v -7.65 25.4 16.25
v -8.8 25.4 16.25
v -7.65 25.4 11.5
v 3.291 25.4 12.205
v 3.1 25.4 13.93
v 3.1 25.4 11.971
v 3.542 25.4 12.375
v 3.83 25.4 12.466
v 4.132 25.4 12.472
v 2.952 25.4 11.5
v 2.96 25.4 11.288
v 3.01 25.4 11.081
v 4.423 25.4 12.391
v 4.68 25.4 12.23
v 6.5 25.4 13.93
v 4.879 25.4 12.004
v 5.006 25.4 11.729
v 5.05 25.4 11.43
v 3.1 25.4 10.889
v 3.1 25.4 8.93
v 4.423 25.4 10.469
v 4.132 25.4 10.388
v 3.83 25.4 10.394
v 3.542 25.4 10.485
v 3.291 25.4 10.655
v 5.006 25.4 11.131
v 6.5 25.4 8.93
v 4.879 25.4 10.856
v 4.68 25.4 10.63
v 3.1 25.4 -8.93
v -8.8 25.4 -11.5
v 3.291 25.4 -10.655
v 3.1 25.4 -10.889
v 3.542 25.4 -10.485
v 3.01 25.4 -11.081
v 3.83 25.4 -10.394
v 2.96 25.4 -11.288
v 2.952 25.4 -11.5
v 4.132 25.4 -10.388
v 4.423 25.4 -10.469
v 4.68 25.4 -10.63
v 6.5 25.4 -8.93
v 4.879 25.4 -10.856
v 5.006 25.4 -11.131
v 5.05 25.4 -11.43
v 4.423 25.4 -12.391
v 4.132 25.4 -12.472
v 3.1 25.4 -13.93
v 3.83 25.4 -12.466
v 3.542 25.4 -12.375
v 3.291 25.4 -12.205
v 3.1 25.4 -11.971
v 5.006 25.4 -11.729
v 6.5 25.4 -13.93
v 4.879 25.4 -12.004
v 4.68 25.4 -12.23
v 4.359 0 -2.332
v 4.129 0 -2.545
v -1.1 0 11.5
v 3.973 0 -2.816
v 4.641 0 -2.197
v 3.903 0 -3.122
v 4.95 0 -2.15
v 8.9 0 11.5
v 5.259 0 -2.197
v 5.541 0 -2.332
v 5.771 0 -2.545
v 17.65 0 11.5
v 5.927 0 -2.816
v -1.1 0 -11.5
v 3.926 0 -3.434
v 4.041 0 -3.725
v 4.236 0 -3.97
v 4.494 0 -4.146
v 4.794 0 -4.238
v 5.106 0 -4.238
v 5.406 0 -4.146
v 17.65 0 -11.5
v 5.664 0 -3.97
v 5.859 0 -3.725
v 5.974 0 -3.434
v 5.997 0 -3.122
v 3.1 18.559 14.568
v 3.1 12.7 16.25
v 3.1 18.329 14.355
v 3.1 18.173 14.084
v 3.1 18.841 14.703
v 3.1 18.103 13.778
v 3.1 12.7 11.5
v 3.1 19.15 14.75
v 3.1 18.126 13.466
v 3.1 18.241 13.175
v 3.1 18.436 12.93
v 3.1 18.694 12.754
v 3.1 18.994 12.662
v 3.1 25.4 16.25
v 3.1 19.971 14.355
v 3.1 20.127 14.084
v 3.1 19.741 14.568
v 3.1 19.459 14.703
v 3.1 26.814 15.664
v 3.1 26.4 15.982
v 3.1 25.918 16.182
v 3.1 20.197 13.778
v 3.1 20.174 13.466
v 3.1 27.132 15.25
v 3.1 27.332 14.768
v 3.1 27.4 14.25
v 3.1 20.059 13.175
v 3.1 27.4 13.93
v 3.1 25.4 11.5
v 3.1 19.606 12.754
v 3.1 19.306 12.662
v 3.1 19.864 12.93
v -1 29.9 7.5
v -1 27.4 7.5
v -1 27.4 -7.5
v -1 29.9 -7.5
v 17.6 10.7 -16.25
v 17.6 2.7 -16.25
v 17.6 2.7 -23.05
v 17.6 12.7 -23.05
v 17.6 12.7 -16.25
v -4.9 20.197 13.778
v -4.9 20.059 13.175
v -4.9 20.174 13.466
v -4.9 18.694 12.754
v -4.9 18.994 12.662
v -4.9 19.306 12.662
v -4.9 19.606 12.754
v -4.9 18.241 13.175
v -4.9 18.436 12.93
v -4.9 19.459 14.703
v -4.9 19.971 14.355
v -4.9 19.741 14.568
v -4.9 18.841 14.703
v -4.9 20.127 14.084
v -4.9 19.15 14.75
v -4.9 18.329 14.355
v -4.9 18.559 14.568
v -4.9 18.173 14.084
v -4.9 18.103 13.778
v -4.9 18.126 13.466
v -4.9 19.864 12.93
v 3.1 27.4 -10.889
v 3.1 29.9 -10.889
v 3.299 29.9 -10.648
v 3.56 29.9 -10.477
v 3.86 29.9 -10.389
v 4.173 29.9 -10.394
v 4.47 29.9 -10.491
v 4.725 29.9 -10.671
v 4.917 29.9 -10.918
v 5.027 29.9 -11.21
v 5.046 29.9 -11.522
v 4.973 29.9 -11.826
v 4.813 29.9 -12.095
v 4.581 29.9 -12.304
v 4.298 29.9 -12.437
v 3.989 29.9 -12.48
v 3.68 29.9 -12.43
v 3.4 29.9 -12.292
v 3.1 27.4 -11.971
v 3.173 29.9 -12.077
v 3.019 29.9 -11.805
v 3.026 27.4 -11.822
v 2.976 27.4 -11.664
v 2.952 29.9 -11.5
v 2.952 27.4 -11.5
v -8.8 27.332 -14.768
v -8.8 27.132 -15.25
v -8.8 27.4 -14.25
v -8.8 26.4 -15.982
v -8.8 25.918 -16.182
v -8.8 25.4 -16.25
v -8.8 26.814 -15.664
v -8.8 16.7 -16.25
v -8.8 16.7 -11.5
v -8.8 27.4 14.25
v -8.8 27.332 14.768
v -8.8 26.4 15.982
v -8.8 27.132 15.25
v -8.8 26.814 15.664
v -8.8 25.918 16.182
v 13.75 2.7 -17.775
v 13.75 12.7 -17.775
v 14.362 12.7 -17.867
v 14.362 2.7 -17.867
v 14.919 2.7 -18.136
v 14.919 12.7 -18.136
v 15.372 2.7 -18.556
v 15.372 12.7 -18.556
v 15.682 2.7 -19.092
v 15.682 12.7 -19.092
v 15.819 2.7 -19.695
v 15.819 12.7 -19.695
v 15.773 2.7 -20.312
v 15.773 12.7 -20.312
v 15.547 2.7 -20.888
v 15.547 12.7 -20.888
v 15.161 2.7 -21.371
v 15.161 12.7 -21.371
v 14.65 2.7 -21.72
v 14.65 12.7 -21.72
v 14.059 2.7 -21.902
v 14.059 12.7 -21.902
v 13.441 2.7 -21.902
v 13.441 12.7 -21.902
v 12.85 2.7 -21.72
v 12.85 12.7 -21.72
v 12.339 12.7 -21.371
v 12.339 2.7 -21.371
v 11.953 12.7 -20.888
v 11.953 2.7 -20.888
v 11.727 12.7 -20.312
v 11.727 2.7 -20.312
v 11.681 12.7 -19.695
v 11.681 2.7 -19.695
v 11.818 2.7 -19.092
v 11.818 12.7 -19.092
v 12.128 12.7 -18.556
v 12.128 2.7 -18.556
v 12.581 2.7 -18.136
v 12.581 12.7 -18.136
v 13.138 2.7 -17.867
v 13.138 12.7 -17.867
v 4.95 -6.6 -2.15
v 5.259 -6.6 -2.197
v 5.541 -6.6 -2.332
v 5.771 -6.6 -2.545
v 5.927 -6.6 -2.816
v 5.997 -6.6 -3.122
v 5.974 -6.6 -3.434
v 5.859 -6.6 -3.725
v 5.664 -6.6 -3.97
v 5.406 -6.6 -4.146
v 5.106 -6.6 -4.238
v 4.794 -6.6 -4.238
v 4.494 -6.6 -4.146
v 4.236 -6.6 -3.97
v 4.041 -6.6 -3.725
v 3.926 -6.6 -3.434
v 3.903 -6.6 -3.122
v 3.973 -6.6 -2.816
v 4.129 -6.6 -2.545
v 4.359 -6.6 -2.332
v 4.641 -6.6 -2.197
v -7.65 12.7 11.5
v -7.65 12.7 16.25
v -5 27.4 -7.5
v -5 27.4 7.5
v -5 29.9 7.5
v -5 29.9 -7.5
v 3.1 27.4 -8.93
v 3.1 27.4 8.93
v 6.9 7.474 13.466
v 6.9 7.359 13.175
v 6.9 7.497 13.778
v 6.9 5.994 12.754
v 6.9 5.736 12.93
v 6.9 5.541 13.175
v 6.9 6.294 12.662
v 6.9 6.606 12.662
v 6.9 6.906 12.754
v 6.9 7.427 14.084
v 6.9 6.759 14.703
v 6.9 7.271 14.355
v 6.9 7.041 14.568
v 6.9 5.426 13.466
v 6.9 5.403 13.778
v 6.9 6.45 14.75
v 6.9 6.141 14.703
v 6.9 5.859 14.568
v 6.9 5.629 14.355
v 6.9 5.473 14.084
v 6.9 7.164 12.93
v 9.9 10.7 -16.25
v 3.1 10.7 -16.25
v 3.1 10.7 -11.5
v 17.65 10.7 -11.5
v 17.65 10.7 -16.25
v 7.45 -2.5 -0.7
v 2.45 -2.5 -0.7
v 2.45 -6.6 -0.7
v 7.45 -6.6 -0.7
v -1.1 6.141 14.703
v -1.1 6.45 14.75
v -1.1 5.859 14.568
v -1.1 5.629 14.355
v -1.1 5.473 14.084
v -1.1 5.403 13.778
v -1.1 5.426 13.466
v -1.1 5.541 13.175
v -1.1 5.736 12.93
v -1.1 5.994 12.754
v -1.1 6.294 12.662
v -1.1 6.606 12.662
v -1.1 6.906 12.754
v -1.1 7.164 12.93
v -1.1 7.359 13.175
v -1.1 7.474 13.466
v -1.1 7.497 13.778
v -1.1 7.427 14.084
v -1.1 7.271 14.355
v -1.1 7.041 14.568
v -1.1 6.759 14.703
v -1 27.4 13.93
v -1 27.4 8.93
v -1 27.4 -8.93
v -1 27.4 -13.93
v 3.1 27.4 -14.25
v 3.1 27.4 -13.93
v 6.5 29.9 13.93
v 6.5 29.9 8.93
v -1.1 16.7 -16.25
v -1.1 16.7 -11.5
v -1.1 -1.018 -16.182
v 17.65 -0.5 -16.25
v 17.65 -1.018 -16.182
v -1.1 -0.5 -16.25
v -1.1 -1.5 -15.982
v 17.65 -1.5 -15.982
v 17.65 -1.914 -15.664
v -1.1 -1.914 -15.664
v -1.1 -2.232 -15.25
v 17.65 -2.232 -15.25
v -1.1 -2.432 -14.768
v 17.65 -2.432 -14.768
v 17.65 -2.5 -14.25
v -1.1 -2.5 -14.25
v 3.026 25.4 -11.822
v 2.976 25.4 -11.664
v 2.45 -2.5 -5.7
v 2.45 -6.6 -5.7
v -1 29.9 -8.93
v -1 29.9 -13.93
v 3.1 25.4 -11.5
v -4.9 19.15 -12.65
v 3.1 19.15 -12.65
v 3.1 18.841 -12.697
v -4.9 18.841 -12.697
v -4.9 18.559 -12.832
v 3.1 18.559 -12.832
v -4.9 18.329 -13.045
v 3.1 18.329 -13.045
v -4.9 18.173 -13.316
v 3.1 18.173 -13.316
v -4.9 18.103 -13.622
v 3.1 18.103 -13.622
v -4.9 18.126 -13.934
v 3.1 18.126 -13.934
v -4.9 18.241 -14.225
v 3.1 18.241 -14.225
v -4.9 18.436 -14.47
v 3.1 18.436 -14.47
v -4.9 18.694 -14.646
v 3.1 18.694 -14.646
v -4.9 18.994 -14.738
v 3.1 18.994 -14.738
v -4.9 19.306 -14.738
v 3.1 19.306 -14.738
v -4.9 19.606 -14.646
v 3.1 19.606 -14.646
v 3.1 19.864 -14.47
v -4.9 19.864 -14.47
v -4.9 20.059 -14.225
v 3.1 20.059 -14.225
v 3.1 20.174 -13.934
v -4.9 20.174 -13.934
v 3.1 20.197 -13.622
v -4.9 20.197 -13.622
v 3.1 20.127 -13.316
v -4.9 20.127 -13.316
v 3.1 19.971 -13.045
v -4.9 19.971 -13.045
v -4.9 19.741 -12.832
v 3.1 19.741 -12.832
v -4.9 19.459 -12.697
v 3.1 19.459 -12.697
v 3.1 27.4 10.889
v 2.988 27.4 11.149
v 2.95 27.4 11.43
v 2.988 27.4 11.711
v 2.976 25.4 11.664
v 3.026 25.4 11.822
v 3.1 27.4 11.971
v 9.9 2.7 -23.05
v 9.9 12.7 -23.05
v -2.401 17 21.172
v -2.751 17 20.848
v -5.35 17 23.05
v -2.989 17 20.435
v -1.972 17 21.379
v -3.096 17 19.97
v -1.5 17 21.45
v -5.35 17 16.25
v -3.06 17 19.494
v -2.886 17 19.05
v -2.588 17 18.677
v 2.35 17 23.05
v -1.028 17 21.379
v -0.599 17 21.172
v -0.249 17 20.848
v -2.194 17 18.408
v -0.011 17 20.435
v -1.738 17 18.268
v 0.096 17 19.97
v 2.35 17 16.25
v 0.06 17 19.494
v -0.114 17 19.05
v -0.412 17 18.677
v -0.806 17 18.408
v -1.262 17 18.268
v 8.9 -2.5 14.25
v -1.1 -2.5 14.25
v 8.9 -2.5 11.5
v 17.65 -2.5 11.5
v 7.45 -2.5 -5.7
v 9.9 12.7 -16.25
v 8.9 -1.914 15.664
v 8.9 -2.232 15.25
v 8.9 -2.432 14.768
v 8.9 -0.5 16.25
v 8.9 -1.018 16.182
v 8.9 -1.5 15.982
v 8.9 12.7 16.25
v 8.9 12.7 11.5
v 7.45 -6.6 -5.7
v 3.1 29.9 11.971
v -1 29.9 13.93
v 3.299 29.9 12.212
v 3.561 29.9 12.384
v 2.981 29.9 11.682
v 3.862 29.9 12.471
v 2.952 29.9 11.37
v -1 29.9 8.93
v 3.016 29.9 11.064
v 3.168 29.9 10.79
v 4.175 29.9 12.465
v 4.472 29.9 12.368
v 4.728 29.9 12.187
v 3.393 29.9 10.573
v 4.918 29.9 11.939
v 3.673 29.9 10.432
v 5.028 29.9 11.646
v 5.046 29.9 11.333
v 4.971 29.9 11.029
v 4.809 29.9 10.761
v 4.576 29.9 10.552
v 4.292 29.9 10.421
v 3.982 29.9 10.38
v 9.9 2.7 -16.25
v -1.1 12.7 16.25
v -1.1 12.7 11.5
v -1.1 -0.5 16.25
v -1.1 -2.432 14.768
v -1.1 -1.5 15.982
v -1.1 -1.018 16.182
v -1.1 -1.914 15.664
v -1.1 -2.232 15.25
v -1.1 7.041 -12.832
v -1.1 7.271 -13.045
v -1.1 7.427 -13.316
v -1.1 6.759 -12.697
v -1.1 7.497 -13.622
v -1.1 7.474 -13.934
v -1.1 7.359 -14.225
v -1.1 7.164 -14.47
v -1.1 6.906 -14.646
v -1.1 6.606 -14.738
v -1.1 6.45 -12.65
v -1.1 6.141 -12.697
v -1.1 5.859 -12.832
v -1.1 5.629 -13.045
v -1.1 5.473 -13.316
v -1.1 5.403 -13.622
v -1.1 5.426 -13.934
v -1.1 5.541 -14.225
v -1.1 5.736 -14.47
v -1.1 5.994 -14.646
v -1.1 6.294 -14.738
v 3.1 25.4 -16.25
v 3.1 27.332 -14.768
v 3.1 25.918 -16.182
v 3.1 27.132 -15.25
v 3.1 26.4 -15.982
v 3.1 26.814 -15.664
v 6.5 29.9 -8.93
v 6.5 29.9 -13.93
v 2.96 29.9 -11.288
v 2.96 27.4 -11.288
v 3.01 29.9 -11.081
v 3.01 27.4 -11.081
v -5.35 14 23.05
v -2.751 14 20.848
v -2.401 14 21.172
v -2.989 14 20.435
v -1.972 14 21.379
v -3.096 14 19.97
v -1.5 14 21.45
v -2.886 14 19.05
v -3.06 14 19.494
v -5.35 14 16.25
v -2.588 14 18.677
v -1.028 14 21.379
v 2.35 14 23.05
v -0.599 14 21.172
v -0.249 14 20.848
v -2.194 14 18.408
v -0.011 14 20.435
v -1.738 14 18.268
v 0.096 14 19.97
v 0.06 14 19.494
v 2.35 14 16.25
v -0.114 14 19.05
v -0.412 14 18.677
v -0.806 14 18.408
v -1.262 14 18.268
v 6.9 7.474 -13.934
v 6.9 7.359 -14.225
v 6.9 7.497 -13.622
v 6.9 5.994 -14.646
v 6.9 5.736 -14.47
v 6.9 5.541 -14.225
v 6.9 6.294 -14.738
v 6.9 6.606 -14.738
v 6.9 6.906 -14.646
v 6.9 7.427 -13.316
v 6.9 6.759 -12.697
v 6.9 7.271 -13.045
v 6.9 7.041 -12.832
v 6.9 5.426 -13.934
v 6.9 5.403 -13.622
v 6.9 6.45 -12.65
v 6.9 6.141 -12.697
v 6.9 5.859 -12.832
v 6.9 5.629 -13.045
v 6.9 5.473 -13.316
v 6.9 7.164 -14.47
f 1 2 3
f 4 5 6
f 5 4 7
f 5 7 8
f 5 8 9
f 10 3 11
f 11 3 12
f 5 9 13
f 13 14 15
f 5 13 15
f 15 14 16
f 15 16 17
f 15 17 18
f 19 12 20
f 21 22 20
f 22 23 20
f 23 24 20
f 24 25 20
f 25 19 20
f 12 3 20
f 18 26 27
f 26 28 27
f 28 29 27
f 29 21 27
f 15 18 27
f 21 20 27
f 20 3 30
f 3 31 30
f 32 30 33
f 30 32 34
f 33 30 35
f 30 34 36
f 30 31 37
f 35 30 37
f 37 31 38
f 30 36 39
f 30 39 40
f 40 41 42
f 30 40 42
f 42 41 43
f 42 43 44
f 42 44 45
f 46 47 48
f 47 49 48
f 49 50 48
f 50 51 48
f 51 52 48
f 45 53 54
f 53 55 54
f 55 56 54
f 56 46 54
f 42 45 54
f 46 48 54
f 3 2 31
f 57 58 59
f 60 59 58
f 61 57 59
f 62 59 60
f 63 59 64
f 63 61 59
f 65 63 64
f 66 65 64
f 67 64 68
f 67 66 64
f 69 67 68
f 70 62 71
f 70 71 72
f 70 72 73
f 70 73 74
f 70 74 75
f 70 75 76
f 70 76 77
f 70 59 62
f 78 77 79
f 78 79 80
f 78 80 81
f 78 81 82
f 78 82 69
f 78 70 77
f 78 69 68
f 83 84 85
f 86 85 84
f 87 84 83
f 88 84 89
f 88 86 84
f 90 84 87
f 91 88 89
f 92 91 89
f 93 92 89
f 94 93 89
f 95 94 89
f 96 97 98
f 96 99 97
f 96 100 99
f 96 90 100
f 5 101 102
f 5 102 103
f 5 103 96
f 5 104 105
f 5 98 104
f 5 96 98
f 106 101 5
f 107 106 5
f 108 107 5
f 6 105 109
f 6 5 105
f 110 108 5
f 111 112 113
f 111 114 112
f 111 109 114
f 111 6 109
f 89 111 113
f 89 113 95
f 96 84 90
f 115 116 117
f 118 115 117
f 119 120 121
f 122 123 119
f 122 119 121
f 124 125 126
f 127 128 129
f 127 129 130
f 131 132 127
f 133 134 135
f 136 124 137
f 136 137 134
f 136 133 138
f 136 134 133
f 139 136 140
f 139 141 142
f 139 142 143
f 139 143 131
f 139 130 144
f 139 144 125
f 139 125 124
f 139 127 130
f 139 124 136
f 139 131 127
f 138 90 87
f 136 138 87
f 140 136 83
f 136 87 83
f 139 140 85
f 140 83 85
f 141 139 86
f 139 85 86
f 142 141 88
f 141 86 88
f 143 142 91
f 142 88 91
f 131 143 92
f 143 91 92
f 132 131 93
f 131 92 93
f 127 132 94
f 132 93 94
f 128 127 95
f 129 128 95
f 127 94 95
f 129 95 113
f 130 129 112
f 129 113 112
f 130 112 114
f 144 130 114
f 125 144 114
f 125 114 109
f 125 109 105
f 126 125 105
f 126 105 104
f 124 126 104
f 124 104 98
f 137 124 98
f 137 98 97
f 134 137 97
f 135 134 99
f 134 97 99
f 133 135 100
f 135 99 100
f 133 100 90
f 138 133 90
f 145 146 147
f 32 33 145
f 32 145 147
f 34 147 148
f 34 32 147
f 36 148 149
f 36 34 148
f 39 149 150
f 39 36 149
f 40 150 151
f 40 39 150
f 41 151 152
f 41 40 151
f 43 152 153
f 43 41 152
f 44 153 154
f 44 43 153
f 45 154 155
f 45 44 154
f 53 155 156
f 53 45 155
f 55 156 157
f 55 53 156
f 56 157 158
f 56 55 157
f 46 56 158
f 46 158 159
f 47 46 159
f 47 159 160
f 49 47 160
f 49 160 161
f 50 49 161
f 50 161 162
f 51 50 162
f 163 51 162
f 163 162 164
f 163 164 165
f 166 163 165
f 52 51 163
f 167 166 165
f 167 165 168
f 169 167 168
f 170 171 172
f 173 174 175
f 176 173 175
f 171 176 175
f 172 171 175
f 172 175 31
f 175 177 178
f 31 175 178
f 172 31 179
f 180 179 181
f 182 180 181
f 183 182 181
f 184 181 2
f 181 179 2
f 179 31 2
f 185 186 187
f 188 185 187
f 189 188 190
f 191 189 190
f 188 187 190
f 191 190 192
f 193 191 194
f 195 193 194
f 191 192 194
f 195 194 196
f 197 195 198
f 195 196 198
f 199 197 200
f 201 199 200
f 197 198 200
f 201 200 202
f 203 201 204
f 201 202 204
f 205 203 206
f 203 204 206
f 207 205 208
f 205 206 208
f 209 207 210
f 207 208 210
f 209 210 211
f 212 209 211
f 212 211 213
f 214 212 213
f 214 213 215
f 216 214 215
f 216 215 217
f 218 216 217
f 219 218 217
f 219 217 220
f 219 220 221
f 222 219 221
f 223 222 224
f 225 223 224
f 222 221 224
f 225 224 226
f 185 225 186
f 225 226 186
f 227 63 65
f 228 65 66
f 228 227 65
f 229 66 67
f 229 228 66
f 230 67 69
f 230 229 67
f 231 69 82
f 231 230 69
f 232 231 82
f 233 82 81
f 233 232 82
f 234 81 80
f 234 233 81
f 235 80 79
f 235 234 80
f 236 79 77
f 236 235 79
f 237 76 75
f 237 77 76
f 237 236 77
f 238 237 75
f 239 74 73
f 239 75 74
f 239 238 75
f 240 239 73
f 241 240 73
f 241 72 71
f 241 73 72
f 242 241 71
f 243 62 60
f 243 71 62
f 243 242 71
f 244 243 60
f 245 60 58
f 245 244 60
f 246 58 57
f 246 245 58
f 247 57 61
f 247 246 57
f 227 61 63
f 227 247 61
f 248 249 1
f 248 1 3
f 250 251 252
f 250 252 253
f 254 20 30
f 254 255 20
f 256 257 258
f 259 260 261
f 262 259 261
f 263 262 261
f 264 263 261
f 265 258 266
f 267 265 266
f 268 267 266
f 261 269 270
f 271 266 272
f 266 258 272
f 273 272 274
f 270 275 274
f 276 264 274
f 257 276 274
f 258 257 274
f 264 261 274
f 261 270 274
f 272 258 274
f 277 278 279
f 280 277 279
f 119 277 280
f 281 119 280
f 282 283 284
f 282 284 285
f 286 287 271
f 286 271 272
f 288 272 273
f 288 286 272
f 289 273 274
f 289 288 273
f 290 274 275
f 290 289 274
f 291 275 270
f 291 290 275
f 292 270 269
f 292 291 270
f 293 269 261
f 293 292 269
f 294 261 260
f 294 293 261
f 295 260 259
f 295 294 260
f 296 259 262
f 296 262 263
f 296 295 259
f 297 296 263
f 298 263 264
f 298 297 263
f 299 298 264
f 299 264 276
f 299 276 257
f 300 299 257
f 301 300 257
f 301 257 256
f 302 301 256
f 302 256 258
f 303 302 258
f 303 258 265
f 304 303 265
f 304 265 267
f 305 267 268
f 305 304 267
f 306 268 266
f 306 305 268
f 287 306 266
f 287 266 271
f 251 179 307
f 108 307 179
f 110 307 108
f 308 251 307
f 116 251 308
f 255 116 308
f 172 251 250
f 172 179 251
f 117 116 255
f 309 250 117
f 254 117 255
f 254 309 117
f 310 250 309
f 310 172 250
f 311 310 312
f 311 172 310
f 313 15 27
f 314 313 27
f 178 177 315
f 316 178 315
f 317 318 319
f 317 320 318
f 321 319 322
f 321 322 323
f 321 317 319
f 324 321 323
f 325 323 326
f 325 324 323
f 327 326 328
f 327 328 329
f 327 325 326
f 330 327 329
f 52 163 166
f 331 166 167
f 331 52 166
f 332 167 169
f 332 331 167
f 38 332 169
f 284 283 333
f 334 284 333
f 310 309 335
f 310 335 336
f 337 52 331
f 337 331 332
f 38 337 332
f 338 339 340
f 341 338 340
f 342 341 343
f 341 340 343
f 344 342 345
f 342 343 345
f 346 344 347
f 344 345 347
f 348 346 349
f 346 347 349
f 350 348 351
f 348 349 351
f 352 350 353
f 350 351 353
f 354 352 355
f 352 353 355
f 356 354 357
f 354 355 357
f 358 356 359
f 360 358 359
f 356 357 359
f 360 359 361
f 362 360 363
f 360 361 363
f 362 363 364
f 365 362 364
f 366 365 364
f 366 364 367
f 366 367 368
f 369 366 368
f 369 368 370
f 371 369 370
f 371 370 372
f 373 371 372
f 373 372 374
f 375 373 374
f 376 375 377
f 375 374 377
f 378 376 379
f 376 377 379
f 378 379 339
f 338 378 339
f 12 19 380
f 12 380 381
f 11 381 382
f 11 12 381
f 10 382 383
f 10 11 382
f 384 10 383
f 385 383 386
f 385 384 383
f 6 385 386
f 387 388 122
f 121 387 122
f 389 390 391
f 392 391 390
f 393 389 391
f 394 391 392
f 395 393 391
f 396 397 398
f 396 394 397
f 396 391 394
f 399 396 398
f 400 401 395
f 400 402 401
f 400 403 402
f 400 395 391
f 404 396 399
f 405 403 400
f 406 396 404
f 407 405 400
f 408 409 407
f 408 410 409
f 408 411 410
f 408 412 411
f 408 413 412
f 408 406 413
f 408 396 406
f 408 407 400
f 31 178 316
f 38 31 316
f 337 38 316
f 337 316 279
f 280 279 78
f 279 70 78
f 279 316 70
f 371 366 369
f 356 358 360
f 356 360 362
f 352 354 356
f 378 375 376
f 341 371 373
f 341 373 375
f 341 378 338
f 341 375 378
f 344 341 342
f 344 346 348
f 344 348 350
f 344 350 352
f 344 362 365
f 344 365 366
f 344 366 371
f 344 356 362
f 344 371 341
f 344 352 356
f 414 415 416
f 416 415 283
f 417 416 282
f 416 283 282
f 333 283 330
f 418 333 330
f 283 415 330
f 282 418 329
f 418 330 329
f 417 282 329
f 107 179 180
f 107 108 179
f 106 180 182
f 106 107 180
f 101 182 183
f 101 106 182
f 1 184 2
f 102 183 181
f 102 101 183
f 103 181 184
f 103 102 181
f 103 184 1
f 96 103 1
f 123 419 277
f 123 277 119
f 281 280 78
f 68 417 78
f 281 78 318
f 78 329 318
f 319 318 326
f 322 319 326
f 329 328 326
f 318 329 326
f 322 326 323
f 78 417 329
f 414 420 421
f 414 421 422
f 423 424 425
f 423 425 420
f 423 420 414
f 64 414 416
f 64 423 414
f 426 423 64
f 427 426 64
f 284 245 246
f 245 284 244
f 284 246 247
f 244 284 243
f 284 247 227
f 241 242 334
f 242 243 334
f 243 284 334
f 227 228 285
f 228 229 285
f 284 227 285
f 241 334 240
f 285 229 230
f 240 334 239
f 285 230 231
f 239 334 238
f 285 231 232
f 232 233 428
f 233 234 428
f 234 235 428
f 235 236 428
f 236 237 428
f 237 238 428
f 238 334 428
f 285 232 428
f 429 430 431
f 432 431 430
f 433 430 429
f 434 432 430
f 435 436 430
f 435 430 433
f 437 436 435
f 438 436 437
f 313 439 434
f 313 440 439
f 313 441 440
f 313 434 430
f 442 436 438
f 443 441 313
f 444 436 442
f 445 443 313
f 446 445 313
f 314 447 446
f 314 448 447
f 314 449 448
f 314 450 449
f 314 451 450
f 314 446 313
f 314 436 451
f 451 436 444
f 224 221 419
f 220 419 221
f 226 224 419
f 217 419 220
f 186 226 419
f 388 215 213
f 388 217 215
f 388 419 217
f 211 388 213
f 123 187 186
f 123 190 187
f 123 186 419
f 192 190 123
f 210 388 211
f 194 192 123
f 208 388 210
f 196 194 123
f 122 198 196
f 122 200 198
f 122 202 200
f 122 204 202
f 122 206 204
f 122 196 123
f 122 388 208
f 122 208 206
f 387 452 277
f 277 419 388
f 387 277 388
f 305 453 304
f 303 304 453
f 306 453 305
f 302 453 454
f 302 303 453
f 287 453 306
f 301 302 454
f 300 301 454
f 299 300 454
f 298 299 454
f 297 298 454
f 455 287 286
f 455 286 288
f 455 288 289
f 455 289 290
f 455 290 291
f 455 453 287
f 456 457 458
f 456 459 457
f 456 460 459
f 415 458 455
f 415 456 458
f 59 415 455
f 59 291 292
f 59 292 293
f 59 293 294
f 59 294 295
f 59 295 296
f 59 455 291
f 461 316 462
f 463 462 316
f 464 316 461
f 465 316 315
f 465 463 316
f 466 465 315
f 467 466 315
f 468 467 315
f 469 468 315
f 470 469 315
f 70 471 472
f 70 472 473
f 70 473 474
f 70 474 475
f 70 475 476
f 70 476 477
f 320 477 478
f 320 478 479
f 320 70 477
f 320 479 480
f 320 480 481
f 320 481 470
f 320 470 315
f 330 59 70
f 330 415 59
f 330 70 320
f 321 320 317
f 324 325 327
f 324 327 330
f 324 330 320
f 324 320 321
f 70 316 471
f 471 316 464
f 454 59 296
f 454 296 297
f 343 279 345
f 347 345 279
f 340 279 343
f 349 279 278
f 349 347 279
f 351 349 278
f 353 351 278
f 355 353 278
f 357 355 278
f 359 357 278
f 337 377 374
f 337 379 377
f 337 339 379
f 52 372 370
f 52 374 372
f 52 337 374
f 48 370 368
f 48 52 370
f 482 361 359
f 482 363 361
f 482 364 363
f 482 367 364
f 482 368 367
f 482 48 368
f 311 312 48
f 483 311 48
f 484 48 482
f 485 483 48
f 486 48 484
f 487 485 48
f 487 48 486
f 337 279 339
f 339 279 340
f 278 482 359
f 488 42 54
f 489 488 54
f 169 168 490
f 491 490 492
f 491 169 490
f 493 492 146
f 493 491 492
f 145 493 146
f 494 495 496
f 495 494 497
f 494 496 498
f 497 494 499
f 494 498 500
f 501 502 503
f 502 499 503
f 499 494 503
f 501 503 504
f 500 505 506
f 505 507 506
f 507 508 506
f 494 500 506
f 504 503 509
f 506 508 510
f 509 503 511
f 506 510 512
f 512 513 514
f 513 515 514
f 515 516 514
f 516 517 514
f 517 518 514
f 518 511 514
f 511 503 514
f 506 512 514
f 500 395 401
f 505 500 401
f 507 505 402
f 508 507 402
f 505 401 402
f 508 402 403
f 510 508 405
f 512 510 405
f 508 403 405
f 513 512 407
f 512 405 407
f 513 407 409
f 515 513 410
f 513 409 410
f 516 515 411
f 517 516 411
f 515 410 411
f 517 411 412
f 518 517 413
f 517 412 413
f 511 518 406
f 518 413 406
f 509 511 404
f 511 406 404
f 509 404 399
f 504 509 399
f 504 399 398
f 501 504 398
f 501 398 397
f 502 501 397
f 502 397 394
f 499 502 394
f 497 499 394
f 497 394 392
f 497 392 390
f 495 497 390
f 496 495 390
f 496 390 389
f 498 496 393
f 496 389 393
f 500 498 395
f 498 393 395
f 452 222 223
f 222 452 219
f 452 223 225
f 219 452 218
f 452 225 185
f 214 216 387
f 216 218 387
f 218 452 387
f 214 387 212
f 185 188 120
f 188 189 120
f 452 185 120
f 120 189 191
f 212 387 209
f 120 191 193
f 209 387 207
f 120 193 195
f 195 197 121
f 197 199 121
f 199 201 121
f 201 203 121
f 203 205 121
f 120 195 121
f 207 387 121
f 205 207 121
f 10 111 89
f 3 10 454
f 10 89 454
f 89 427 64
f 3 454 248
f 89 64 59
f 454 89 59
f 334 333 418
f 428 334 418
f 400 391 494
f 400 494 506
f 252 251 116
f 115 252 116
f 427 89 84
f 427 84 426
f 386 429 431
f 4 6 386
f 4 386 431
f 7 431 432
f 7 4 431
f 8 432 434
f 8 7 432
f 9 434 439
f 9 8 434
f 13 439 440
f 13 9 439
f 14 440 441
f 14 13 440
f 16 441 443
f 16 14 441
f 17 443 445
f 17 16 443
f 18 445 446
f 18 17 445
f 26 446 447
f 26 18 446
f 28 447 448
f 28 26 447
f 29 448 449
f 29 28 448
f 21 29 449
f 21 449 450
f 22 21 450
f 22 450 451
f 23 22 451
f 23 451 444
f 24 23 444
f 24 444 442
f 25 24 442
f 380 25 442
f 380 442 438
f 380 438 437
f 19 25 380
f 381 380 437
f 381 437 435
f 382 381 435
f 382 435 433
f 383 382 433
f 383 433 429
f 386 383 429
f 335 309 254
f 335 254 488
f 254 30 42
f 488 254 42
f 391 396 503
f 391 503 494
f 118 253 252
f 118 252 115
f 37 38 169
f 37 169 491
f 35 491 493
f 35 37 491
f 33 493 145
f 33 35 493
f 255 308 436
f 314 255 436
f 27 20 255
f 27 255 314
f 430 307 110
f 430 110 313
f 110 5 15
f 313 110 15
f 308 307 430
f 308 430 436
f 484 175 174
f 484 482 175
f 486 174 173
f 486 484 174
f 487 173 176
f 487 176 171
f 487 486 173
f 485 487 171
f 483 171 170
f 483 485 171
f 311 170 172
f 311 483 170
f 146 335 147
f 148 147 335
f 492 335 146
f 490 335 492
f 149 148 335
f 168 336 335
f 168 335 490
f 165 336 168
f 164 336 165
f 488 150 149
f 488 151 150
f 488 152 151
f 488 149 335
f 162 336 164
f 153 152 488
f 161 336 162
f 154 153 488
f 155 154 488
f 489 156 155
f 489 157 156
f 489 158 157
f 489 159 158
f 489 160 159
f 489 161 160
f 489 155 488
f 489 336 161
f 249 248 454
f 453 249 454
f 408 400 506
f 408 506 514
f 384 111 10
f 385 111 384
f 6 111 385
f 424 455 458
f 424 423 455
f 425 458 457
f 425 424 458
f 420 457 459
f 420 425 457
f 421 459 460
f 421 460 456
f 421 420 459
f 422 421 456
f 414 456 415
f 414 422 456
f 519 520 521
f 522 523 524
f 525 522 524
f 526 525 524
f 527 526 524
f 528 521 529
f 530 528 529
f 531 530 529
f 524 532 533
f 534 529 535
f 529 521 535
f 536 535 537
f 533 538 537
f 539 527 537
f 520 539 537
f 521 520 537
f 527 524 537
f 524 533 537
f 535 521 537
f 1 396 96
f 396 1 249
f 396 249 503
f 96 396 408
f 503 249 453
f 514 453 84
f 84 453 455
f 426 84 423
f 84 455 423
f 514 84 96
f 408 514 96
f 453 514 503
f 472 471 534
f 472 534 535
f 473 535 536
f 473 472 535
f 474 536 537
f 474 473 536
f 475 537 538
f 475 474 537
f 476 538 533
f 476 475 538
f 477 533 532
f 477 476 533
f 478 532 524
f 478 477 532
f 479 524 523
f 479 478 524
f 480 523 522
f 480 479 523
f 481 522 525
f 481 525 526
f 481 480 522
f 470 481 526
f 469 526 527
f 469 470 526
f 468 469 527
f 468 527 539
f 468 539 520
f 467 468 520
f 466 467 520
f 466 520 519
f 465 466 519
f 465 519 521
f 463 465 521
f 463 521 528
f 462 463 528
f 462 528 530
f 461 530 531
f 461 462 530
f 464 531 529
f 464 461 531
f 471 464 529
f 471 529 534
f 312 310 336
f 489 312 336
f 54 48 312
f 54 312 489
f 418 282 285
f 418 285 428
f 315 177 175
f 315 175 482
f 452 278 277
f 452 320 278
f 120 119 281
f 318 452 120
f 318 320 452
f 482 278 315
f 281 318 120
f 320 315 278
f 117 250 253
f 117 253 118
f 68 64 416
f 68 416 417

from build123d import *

# Parameters (mm, degrees)
BOSS_EXTRUDE1_DEPTH      = 2.5
BOSS_EXTRUDE2_DEPTH      = 12.7
BOSS_EXTRUDE3_START      = 12.7
SKETCH3_W                = 11.9
SKETCH3_H                = 4.75
SKETCH3_W_2              = 10.75
BOSS_EXTRUDE3_DEPTH      = 12.7
BOSS_EXTRUDE4_START      = 25.4
SKETCH3_3_W              = 11.9
SKETCH3_3_H              = 4.75
SKETCH3_3_W_2            = 10.75
SKETCH3_3_W_3            = 1.15
BOSS_EXTRUDE4_DEPTH      = 2
CUT_EXTRUDE1_START       = -1.1
SKETCH2_R                = 1.05
CUT_EXTRUDE1_DEPTH       = 8
CUT_EXTRUDE2_START       = 3.1
SKETCH2_3_R              = 1.05
CUT_EXTRUDE2_DEPTH       = 8
BOSS_EXTRUDE5_START      = 17
SKETCH1_4_R              = 1.6
BOSS_EXTRUDE5_DEPTH      = 3
BOSS_EXTRUDE6_START      = 12.7
SKETCH1_7_W              = 7.7
SKETCH1_7_H              = 6.8
SKETCH1_7_R              = 2.075
BOSS_EXTRUDE6_DEPTH      = 10
FILLET1_R                = 2
CUT_EXTRUDE3_START       = 12.7
SKETCH5_W                = 14.55
SKETCH5_H                = 4.75
CUT_EXTRUDE3_DEPTH       = 2
CUT_EXTRUDE4_START       = 12.7
SKETCH6_W                = 7.7
SKETCH6_H                = 4.75
CUT_EXTRUDE4_DEPTH       = 4
BOSS_EXTRUDE7_DEPTH      = 2.5
BOSS_EXTRUDE7_DEPTH_BACK = 2
BOSS_EXTRUDE7_START      = 27.4
SKETCH7_W                = 4
SKETCH7_H                = 15
SKETCH7_W_2              = 5
SKETCH7_H_2              = 5
SKETCH7_R                = 1.05
SKETCH7_W_3              = 2.5
BOSS_EXTRUDE8_START      = -2.5
SKETCH8_W                = 5
SKETCH8_H                = 5
SKETCH8_R                = 1.05
BOSS_EXTRUDE8_DEPTH      = 4.1
CUT_EXTRUDE5_DEPTH       = 42.675352428
CUT_EXTRUDE5_DEPTH_BACK  = 42.675352428
SKETCH8_2_R              = 1.05
CUT_EXTRUDE6_START       = 25.4
SKETCH7_4_R              = 1.05
CUT_EXTRUDE6_DEPTH       = 4.5


with BuildPart() as part:
    # Sketch1 → Boss-Extrude1 (new body)
    with BuildSketch(Plane(origin=(0, 0, 0), x_dir=(1, 0, 0), z_dir=(0, 1, 0))):
        Polygon((-1.1, 16.25), (-1.1, -16.25), (8.9, -16.25), (8.9, -11.5), (17.65, -11.5), (17.65, 16.25), align=None)
    extrude(amount=-BOSS_EXTRUDE1_DEPTH)

    # Sketch1<3> → Boss-Extrude2 (add)
    with BuildSketch(Plane(origin=(0, 0, 0), x_dir=(1, 0, 0), z_dir=(0, 1, 0))):
        Polygon((9.9, 16.25), (-1.1, 16.25), (-1.1, 11.5), (17.65, 11.5), (17.65, 16.25), (17.6, 16.25), align=None)
        Polygon((8.9, -11.5), (-1.1, -11.5), (-1.1, -16.25), (2.35, -16.25), (8.9, -16.25), align=None)
    extrude(amount=BOSS_EXTRUDE2_DEPTH)

    # Sketch3 → Boss-Extrude3 (add)
    with BuildSketch(Plane(origin=(0, 0, 0), x_dir=(1, 0, 0), z_dir=(0, 1, 0)).offset(BOSS_EXTRUDE3_START)):
        with Locations((-2.85, 13.875)):
            Rectangle(SKETCH3_W, SKETCH3_H)
        with Locations((-2.275, -13.875)):
            Rectangle(SKETCH3_W_2, SKETCH3_H)
    extrude(amount=BOSS_EXTRUDE3_DEPTH)

    # Sketch3<3> → Boss-Extrude4 (add)
    with BuildSketch(Plane(origin=(0, 0, 0), x_dir=(1, 0, 0), z_dir=(0, 1, 0)).offset(BOSS_EXTRUDE4_START)):
        with Locations((-2.85, 13.875)):
            Rectangle(SKETCH3_3_W, SKETCH3_3_H)
        Polygon((3.1, -11.5), (3.1, 11.5), (-8.8, 11.5), (-8.8, -11.5), (-7.65, -11.5), align=None)
        with Locations((-2.275, -13.875)):
            Rectangle(SKETCH3_3_W_2, SKETCH3_3_H)
        with Locations((-8.225, -13.875)):
            Rectangle(SKETCH3_3_W_3, SKETCH3_3_H)
    extrude(amount=BOSS_EXTRUDE4_DEPTH)

    # Sketch2 → Cut-Extrude1 (cut)
    with BuildSketch(Plane(origin=(0, 0, 0), x_dir=(0, 0, -1), z_dir=(1, 0, 0)).offset(CUT_EXTRUDE1_START)):
        with Locations(Location((-13.7, 6.45, 0), (0, 0, 180))):
            Circle(SKETCH2_R)
        with Locations(Location((13.7, 6.45, 0), (0, 0, 180))):
            Circle(SKETCH2_R)
    extrude(amount=CUT_EXTRUDE1_DEPTH, mode=Mode.SUBTRACT)

    # Sketch2<3> → Cut-Extrude2 (cut)
    with BuildSketch(Plane(origin=(0, 0, 0), x_dir=(0, 0, -1), z_dir=(1, 0, 0)).offset(CUT_EXTRUDE2_START)):
        with Locations(Location((13.7, 19.15, 0), (0, 0, 180))):
            Circle(SKETCH2_3_R)
        with Locations(Location((-13.7, 19.15, 0), (0, 0, 180))):
            Circle(SKETCH2_3_R)
    extrude(amount=-CUT_EXTRUDE2_DEPTH, mode=Mode.SUBTRACT)

    # Sketch1<4> → Boss-Extrude5 (add)
    with BuildSketch(Plane(origin=(0, 0, 0), x_dir=(1, 0, 0), z_dir=(0, 1, 0)).offset(BOSS_EXTRUDE5_START)):
        Polygon((2.35, -16.25), (-1.1, -16.25), (-3.8, -16.25), (-5.35, -16.25), (-5.35, -23.05), (2.35, -23.05), align=None)
        with Locations(Location((-1.5, -19.85, 0), (0, 0, 270))):
            Circle(SKETCH1_4_R, mode=Mode.SUBTRACT)
    extrude(amount=-BOSS_EXTRUDE5_DEPTH)

    # Sketch1<7> → Boss-Extrude6 (add)
    with BuildSketch(Plane(origin=(0, 0, 0), x_dir=(1, 0, 0), z_dir=(0, 1, 0)).offset(BOSS_EXTRUDE6_START)):
        with Locations((13.75, 19.65)):
            Rectangle(SKETCH1_7_W, SKETCH1_7_H)
        with Locations(Location((13.75, 19.85, 0), (0, 0, 270))):
            Circle(SKETCH1_7_R, mode=Mode.SUBTRACT)
    extrude(amount=-BOSS_EXTRUDE6_DEPTH)

    # Fillet1
    fillet1_edges = [part.edges().sort_by_distance(p)[0] for p in [
        (3.9, -2.5, 16.25),
        (-2.85, 27.4, 16.25),
        (8.275, -2.5, -16.25),
        (-2.85, 27.4, -16.25),
    ]]
    fillet(fillet1_edges, radius=FILLET1_R)

    # Sketch5 → Cut-Extrude3 (cut)
    with BuildSketch(Plane(origin=(0, 0, 0), x_dir=(1, 0, 0), z_dir=(0, 1, 0)).offset(CUT_EXTRUDE3_START)):
        with Locations((10.375, 13.875)):
            Rectangle(SKETCH5_W, SKETCH5_H)
    extrude(amount=-CUT_EXTRUDE3_DEPTH, mode=Mode.SUBTRACT)

    # Sketch6 → Cut-Extrude4 (cut)
    with BuildSketch(Plane(origin=(0, 0, 0), x_dir=(1, 0, 0), z_dir=(0, 1, 0)).offset(CUT_EXTRUDE4_START)):
        with Locations((-4.95, 13.875)):
            Rectangle(SKETCH6_W, SKETCH6_H)
    extrude(amount=CUT_EXTRUDE4_DEPTH, mode=Mode.SUBTRACT)

    # Sketch7 → Boss-Extrude7 (add, two sides: drawn at the far end of the back side and taken through both)
    # profile 1 of 5: a face of its own
    with BuildSketch(Plane(origin=(0, 0, 0), x_dir=(1, 0, 0), z_dir=(0, 1, 0)).offset(BOSS_EXTRUDE7_START - BOSS_EXTRUDE7_DEPTH_BACK)):
        with Locations((-3, 0)):
            Rectangle(SKETCH7_W, SKETCH7_H)
    # profile 2 of 5: a face of its own
    with BuildSketch(Plane(origin=(0, 0, 0), x_dir=(1, 0, 0), z_dir=(0, 1, 0)).offset(BOSS_EXTRUDE7_START - BOSS_EXTRUDE7_DEPTH_BACK)):
        with Locations((4, -11.43)):
            Rectangle(SKETCH7_W_2, SKETCH7_H_2)
        with Locations(Location((4, -11.43, 0), (0, 0, 211.002719134))):
            Circle(SKETCH7_R, mode=Mode.SUBTRACT)
    # profile 3 of 5: a face of its own
    with BuildSketch(Plane(origin=(0, 0, 0), x_dir=(1, 0, 0), z_dir=(0, 1, 0)).offset(BOSS_EXTRUDE7_START - BOSS_EXTRUDE7_DEPTH_BACK)):
        with Locations((0.25, -11.43)):
            Rectangle(SKETCH7_W_3, SKETCH7_H_2)
    # profile 4 of 5: a face of its own
    with BuildSketch(Plane(origin=(0, 0, 0), x_dir=(1, 0, 0), z_dir=(0, 1, 0)).offset(BOSS_EXTRUDE7_START - BOSS_EXTRUDE7_DEPTH_BACK)):
        with Locations((0.25, 11.43)):
            Rectangle(SKETCH7_W_3, SKETCH7_H_2)
    # profile 5 of 5: a face of its own
    with BuildSketch(Plane(origin=(0, 0, 0), x_dir=(1, 0, 0), z_dir=(0, 1, 0)).offset(BOSS_EXTRUDE7_START - BOSS_EXTRUDE7_DEPTH_BACK)):
        with Locations((4, 11.43)):
            Rectangle(SKETCH7_W_2, SKETCH7_H_2)
        with Locations(Location((4, 11.43, 0), (0, 0, 211.002719134))):
            Circle(SKETCH7_R, mode=Mode.SUBTRACT)
    extrude(amount=BOSS_EXTRUDE7_DEPTH + BOSS_EXTRUDE7_DEPTH_BACK)

    # Sketch8 → Boss-Extrude8 (add)
    with BuildSketch(Plane(origin=(0, 0, 0), x_dir=(1, 0, 0), z_dir=(0, 1, 0)).offset(BOSS_EXTRUDE8_START)):
        with Locations((4.95, 3.2)):
            Rectangle(SKETCH8_W, SKETCH8_H)
        with Locations(Location((4.95, 3.2, 0), (0, 0, 270))):
            Circle(SKETCH8_R, mode=Mode.SUBTRACT)
    extrude(amount=-BOSS_EXTRUDE8_DEPTH)

    # Sketch8<2> → Cut-Extrude5 (cut, two sides: drawn at the far end of the back side and taken through both)
    with BuildSketch(Plane(origin=(0, 0, 0), x_dir=(1, 0, 0), z_dir=(0, 1, 0)).offset(-CUT_EXTRUDE5_DEPTH_BACK)):
        with Locations(Location((4.95, 3.2, 0), (0, 0, 270))):
            Circle(SKETCH8_2_R)
    extrude(amount=CUT_EXTRUDE5_DEPTH + CUT_EXTRUDE5_DEPTH_BACK, mode=Mode.SUBTRACT)

    # Sketch7<4> → Cut-Extrude6 (cut)
    with BuildSketch(Plane(origin=(0, 0, 0), x_dir=(1, 0, 0), z_dir=(0, 1, 0)).offset(CUT_EXTRUDE6_START)):
        with Locations(Location((4, 11.43, 0), (0, 0, 176.177446271))):
            Circle(SKETCH7_4_R)
        with Locations(Location((4, -11.43, 0), (0, 0, 211.002719134))):
            Circle(SKETCH7_4_R)
    extrude(amount=CUT_EXTRUDE6_DEPTH, mode=Mode.SUBTRACT)


solid = part.part
